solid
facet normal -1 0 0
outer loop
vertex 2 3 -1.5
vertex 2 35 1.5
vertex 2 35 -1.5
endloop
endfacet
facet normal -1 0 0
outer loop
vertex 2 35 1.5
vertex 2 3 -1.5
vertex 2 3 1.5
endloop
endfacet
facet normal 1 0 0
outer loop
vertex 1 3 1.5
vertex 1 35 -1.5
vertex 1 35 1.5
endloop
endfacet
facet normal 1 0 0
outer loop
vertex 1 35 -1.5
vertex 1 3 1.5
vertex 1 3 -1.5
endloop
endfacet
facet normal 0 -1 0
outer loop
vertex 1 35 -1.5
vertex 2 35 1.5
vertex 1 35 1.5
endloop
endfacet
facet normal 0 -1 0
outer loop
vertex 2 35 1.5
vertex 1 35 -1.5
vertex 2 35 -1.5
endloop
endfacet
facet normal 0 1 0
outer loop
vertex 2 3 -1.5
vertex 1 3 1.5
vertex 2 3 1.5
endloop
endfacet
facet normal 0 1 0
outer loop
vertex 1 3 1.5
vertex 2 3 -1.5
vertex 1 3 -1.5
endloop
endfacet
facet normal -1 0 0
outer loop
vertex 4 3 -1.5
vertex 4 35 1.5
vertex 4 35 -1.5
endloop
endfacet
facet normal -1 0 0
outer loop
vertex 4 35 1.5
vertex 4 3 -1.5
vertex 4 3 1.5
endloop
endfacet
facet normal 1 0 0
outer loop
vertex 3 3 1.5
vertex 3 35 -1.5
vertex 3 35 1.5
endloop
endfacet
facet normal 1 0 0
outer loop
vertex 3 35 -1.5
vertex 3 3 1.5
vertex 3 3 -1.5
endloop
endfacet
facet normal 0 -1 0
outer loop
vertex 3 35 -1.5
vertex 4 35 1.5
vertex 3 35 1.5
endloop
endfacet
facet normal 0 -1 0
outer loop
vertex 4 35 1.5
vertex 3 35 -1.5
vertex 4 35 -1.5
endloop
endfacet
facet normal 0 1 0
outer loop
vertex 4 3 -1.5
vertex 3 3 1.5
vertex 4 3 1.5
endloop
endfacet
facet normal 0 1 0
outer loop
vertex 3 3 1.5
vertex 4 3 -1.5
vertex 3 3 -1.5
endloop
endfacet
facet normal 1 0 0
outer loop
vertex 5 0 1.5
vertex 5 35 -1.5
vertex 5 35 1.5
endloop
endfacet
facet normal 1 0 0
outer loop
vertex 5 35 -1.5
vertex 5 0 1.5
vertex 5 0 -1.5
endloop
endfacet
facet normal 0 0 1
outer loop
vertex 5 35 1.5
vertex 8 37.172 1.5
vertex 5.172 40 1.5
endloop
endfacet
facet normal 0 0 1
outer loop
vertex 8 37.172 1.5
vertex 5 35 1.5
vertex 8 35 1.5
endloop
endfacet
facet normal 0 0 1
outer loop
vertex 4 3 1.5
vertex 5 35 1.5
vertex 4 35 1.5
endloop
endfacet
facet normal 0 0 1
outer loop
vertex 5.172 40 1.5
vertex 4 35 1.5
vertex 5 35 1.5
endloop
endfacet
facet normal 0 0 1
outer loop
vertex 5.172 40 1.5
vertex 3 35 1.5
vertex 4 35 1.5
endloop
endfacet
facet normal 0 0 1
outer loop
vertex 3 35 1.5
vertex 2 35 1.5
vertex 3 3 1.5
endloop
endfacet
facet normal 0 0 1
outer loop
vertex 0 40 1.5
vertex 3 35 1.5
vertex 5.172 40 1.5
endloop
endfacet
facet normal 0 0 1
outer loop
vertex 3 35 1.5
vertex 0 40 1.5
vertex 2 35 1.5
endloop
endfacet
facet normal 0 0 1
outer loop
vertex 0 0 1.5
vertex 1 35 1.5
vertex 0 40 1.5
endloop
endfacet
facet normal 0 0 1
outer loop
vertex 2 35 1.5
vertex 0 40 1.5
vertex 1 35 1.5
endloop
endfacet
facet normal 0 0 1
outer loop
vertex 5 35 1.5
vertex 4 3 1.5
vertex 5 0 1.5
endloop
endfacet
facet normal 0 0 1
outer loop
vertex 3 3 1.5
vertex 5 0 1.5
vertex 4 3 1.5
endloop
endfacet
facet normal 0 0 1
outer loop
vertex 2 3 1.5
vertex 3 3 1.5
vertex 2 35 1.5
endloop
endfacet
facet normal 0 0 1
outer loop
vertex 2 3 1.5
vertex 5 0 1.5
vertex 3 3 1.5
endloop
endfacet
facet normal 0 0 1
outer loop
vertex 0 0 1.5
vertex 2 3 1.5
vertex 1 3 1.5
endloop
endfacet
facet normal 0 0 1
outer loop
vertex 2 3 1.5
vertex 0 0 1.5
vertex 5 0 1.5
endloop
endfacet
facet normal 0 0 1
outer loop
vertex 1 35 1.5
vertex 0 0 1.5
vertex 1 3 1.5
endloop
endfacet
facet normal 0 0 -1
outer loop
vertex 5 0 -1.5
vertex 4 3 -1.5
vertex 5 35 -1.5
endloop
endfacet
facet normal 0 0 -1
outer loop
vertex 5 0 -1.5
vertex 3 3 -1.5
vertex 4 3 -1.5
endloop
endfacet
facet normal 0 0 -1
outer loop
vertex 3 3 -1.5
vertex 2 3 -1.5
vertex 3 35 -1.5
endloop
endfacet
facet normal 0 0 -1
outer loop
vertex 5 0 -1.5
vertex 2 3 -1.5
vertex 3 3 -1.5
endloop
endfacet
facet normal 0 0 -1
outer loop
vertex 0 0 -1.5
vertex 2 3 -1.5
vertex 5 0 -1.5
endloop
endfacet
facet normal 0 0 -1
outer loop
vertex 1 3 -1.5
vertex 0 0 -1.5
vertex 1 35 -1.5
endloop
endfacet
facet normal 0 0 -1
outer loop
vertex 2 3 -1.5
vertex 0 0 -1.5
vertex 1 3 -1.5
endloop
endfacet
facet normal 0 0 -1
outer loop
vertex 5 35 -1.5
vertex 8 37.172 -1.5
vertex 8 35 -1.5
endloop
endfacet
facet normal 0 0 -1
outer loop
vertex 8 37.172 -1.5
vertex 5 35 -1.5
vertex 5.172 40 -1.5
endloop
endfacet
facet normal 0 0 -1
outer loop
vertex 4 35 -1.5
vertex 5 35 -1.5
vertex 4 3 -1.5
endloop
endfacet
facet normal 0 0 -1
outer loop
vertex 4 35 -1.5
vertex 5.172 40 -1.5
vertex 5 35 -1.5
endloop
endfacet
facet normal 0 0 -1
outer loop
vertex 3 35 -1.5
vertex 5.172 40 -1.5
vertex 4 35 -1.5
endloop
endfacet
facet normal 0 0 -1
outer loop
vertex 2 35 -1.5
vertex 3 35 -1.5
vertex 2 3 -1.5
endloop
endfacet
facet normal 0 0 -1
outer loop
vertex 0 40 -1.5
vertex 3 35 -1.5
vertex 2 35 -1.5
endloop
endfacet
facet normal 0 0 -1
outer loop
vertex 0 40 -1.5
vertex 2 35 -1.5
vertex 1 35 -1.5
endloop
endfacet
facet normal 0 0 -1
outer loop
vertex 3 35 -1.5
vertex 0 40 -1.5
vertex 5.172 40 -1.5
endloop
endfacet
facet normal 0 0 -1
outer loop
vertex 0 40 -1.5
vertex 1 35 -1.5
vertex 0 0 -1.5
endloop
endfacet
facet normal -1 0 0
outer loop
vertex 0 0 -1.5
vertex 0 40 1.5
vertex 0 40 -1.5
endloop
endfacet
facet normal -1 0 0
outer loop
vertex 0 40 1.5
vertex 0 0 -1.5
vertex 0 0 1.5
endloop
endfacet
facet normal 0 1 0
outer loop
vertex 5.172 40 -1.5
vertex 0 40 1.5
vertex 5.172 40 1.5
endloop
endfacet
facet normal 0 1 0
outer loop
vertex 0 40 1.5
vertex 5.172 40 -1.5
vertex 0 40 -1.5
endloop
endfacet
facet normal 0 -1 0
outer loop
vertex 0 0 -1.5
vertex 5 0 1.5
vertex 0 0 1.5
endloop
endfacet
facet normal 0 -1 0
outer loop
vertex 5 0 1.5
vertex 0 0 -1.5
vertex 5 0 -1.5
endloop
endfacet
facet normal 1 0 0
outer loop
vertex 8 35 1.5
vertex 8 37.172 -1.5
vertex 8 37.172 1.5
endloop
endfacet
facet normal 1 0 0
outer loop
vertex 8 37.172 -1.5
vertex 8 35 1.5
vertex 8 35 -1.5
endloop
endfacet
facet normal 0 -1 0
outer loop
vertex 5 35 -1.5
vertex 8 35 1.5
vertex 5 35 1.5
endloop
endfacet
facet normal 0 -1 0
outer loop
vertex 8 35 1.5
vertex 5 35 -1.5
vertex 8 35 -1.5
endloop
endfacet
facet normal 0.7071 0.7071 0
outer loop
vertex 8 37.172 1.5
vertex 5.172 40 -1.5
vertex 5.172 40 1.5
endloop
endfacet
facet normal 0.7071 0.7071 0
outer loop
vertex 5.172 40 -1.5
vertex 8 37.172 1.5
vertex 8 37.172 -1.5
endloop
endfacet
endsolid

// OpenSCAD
material_z = 3;
nothing = 0.01;

module snap_feather(
            width,
            height,
            hook_width,
            hook_height,
            hook_cutaway,
            leg_width,
            leg_count,
            leg_offset
            )
{
    // feather leg(s)
    difference()
    {
        translate([
            width/2,
            height/2,
            0
            ])
        cube([
            width,
            height,
            material_z
            ], center=true);
        
        leg_width = width/(2*leg_count-1);
        leg_height = height - hook_height - leg_offset;
        for (i=[1:leg_count-1])
        {
            translate([
                leg_width/2 + (i*2-1)*leg_width,
                leg_height/2 + leg_offset,
                0
                ])
            cube([
                leg_width,
                leg_height,
                material_z + 2*nothing
                ], center=true);
        }
    }

    // feather head
    translate([
        width + hook_width/2,
        height - hook_height/2,
        0
        ])
    difference()
    {
        cube([
            hook_width,
            hook_height,
            material_z
            ], center=true);
        
        // cut away a corner
        translate([
            hook_width/2,
            hook_height/2,
            0
            ])
        rotate(45)
        cube([
            hook_cutaway,
            hook_cutaway,
            material_z + 2*nothing
            ], center=true);
    }
}

snap_feather(
    width=5,
    height=40,
    hook_width=3,
    hook_height=5,
    hook_cutaway=4,
    leg_width=2,
    leg_count=3,
    leg_offset=3
    );
